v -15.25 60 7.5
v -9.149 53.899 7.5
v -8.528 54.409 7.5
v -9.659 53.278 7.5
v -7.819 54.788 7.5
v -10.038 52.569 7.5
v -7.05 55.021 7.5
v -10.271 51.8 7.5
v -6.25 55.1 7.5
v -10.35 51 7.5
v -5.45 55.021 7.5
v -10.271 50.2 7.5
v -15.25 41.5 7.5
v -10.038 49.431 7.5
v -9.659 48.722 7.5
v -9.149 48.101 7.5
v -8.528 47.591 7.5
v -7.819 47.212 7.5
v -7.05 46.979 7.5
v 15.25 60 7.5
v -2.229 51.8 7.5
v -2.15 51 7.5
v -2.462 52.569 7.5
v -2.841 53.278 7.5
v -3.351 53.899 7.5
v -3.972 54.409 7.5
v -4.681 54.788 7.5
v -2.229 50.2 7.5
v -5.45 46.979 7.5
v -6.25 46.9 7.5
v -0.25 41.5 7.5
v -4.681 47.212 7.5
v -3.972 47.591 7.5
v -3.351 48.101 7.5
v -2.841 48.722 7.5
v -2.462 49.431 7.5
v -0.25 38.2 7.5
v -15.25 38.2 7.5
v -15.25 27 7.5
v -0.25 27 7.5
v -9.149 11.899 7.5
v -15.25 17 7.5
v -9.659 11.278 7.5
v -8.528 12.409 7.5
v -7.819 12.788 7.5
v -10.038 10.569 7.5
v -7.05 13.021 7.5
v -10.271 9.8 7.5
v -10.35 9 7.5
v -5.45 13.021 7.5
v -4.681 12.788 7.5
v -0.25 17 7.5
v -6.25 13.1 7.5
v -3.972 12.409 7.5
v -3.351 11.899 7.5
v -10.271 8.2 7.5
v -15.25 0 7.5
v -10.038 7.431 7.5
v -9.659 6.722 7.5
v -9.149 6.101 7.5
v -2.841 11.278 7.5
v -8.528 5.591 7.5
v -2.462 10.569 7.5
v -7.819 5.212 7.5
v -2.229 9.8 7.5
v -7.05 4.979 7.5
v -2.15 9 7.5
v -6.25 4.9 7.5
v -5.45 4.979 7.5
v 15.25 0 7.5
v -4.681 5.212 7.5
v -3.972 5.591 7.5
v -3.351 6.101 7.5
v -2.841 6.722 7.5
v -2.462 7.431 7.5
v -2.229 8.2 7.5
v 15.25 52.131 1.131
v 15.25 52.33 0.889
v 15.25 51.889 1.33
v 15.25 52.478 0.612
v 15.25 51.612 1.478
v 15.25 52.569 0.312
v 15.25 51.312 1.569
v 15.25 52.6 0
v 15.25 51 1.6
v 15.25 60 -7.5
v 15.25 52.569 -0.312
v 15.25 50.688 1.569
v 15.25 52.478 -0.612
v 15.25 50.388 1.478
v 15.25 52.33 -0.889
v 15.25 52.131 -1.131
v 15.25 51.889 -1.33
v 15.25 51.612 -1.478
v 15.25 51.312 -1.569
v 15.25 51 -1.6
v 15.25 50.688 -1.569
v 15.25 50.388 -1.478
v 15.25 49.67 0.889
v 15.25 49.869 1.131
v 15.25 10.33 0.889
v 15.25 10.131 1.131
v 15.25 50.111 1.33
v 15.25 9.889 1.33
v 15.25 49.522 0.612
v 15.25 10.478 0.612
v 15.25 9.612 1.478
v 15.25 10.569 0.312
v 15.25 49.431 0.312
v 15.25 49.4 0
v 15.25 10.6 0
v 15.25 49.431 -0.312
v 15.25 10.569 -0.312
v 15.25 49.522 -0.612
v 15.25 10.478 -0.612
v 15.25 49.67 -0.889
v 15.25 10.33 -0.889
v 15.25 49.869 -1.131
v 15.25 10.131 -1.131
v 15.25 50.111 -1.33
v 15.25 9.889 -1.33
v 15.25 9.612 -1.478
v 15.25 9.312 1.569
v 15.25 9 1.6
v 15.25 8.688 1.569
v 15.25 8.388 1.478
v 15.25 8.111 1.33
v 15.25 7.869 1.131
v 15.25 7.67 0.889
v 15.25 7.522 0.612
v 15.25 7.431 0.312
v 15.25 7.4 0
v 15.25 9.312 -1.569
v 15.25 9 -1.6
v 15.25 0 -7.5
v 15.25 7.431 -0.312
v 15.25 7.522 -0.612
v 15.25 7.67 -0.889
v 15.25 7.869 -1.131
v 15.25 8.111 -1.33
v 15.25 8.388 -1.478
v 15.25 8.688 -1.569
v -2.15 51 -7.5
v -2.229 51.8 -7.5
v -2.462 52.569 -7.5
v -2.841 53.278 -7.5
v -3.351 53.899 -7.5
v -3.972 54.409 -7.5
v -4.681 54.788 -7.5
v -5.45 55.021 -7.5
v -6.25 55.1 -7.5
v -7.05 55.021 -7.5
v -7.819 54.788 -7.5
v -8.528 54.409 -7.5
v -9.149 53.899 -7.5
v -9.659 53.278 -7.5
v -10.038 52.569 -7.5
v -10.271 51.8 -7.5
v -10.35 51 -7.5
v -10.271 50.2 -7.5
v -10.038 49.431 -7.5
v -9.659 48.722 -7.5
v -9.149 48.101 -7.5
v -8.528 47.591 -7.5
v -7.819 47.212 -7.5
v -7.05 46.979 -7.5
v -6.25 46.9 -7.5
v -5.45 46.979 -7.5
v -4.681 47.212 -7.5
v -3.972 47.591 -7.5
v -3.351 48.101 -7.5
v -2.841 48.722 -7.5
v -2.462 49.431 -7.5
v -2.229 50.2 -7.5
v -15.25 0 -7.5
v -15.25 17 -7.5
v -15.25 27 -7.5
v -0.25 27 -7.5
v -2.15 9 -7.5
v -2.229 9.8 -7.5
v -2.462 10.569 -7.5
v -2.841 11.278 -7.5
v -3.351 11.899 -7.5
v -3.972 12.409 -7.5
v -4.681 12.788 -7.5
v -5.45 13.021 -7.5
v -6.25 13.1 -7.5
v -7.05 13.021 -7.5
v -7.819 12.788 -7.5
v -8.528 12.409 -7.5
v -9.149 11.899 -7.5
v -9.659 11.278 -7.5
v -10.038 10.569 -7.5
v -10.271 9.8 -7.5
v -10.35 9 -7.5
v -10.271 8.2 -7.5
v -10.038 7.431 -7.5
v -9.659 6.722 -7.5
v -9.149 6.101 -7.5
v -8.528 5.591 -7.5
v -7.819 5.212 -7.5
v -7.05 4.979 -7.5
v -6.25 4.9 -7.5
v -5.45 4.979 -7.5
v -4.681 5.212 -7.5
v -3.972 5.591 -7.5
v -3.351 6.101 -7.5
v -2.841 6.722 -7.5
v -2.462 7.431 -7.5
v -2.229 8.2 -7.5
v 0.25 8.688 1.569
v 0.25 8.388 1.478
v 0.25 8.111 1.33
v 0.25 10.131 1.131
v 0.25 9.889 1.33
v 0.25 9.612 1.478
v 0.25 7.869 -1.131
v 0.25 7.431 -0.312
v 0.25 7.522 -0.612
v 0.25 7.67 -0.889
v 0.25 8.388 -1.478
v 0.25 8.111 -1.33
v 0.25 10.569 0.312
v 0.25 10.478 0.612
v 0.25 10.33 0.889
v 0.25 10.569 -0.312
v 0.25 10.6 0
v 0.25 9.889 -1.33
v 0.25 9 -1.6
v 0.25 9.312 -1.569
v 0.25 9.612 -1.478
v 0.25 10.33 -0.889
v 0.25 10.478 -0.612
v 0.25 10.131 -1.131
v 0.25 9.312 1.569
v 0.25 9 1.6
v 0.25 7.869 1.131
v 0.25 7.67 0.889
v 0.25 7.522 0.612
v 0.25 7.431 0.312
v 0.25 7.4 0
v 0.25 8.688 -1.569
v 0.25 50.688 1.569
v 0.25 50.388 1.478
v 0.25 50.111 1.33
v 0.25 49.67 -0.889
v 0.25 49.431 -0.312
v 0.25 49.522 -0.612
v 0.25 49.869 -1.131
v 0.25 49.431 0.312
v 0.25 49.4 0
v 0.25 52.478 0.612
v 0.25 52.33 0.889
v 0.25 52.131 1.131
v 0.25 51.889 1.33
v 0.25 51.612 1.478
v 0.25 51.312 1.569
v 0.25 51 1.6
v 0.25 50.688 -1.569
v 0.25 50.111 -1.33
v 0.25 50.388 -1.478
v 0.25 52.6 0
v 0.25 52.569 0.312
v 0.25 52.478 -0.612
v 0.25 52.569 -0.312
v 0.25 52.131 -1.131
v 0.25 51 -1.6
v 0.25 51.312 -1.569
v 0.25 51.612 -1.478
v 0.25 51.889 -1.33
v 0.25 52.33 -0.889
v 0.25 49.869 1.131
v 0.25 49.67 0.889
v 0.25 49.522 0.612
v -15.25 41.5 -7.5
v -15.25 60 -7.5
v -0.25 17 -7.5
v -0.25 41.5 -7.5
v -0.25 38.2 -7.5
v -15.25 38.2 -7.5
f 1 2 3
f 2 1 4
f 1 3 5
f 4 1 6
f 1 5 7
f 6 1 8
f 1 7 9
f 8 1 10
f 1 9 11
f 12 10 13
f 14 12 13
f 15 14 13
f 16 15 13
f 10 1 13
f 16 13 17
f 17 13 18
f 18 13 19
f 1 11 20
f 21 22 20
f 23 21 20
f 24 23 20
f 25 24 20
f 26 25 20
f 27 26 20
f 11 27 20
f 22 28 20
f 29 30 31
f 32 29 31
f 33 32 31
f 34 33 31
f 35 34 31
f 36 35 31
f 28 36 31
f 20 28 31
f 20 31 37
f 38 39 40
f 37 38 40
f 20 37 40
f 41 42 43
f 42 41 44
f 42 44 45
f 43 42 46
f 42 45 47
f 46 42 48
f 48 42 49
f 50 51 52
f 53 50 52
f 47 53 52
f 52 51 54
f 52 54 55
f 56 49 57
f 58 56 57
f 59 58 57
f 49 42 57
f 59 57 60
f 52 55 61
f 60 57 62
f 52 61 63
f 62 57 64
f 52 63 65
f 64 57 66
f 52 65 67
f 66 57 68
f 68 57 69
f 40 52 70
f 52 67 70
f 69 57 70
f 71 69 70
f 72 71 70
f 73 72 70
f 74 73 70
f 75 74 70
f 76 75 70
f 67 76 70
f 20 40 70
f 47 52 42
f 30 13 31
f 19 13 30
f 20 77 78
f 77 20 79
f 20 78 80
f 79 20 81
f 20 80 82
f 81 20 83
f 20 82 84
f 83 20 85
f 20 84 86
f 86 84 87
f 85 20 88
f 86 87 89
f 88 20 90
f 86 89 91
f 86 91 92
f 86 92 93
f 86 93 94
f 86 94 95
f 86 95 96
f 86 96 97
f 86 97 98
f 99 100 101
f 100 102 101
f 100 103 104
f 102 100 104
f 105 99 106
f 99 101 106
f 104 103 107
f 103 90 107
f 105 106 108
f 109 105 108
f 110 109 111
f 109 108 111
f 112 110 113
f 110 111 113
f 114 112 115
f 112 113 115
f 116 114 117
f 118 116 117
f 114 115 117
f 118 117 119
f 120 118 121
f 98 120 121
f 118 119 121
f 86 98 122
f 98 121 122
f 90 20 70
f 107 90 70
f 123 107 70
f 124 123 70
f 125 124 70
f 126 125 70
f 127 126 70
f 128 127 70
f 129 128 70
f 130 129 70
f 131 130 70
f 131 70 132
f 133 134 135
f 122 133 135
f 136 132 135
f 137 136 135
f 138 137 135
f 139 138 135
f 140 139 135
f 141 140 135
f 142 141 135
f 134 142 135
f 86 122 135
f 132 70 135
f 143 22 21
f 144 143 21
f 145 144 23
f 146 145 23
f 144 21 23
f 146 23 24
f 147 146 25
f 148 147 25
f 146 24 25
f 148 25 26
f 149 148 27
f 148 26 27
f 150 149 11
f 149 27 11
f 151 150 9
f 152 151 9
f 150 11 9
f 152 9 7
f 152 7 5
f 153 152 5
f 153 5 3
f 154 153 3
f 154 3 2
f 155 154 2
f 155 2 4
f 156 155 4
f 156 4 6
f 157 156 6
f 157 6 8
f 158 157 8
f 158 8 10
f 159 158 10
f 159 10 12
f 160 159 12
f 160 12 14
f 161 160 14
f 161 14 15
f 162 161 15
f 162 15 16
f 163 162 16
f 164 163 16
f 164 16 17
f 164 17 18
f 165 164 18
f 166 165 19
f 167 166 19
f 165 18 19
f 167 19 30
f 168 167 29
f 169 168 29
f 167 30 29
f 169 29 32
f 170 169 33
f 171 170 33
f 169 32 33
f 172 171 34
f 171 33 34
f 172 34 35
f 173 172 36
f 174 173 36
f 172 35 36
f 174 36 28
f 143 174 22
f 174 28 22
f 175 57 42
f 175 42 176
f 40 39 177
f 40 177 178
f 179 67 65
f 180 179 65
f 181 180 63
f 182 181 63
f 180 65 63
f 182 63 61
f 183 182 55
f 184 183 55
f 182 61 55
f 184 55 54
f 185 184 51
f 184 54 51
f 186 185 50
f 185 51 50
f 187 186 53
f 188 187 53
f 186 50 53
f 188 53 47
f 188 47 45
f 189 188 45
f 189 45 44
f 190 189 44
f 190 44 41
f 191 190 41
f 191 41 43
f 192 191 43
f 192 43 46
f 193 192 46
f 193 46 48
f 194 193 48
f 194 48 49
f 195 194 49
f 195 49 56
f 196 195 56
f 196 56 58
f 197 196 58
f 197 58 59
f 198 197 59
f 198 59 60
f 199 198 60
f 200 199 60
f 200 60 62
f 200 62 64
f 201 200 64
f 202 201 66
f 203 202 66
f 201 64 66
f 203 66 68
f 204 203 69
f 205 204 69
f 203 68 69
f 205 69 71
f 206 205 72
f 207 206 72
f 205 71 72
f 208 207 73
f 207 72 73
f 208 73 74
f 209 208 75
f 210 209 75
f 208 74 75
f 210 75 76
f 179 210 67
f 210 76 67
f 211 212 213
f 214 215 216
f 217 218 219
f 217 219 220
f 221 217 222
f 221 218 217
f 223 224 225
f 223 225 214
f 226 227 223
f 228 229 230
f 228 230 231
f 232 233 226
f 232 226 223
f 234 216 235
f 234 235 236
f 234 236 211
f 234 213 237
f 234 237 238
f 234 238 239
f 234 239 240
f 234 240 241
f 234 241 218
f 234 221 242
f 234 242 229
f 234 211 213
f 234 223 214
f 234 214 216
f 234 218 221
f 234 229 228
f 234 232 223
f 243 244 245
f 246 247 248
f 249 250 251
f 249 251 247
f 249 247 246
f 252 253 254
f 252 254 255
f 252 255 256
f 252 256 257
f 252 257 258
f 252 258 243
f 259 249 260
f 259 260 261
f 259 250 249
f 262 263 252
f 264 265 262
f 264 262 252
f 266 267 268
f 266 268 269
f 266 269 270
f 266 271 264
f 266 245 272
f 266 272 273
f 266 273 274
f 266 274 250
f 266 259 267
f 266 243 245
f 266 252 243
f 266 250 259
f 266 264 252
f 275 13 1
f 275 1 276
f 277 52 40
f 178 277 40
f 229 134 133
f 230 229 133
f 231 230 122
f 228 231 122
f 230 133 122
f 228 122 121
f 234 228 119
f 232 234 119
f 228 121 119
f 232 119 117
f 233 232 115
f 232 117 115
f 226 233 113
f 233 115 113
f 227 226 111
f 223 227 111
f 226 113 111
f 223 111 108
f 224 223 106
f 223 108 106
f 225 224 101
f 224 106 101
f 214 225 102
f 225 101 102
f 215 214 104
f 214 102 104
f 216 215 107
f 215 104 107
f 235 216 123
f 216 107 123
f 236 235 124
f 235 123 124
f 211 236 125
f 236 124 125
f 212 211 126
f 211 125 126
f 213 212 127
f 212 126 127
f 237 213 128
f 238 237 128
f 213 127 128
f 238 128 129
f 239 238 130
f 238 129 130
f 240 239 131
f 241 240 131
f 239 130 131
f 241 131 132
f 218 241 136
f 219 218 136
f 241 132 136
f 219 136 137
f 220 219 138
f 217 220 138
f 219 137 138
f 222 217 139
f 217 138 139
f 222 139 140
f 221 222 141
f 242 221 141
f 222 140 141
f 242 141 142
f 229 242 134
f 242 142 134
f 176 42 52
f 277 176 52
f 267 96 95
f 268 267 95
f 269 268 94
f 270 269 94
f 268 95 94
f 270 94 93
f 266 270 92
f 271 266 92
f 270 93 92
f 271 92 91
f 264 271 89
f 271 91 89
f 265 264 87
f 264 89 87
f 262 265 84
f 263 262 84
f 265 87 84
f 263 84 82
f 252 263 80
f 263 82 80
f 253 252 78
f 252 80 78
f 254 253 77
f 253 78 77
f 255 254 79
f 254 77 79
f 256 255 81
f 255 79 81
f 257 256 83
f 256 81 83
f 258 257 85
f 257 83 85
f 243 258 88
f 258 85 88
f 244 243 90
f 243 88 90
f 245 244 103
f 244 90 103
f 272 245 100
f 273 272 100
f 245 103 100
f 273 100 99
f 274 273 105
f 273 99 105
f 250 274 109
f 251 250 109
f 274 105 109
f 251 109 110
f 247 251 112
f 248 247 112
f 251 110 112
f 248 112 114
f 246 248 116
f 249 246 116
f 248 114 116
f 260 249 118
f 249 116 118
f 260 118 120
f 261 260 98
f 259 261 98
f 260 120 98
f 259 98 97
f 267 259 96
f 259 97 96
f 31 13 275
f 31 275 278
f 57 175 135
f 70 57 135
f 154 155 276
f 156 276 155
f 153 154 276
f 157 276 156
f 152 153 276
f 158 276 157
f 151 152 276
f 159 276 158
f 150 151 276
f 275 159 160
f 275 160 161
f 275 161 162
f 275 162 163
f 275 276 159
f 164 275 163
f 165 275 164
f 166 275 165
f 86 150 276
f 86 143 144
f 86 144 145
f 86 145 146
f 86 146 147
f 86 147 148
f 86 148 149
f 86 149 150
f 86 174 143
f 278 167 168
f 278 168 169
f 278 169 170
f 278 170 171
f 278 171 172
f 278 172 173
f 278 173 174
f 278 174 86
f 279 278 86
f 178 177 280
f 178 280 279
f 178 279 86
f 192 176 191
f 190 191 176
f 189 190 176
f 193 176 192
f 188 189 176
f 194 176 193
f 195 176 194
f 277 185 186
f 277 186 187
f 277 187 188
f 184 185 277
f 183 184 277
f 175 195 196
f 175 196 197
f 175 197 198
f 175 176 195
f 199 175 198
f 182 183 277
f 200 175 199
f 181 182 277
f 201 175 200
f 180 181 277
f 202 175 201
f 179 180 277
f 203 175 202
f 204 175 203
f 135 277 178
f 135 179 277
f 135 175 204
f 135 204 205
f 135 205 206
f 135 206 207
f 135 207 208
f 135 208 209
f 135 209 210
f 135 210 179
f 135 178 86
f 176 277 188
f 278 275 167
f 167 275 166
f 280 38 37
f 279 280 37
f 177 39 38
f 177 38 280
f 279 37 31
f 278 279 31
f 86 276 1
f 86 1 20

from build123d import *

# Parameters (mm, degrees)
SKETCH1_W           = 30.5
SKETCH1_H           = 15
BOSS_EXTRUDE1_DEPTH = 60
SKETCH2_R           = 4.1
CUT_EXTRUDE1_DEPTH  = 16
SKETCH4_W           = 15
SKETCH4_H           = 3.3
CUT_EXTRUDE2_DEPTH  = 16
SKETCH5_W           = 15
SKETCH5_H           = 10
CUT_EXTRUDE3_DEPTH  = 16
SKETCH6_R           = 1.6
CUT_EXTRUDE4_DEPTH  = 15


with BuildPart() as part:
    # Sketch1 → Boss-Extrude1 (new body)
    with BuildSketch(Plane(origin=(0, 0, 0), x_dir=(1, 0, 0), z_dir=(0, 1, 0))):
        Rectangle(SKETCH1_W, SKETCH1_H)
    extrude(amount=BOSS_EXTRUDE1_DEPTH)

    # Sketch2 → Cut-Extrude1 (cut, through all)
    with BuildSketch(Plane.XY.offset(7.5)):
        with Locations((-6.25, 51)):
            Circle(SKETCH2_R)
        with Locations((-6.25, 9)):
            Circle(SKETCH2_R)
    extrude(amount=-CUT_EXTRUDE1_DEPTH, mode=Mode.SUBTRACT)

    # Sketch4 → Cut-Extrude2 (cut, through all)
    with BuildSketch(Plane.XY.offset(7.5)):
        with Locations((-7.75, 39.85)):
            Rectangle(SKETCH4_W, SKETCH4_H)
    extrude(amount=-CUT_EXTRUDE2_DEPTH, mode=Mode.SUBTRACT)

    # Sketch5 → Cut-Extrude3 (cut, through all)
    with BuildSketch(Plane.XY.offset(7.5)):
        with Locations((-7.75, 22)):
            Rectangle(SKETCH5_W, SKETCH5_H)
    extrude(amount=-CUT_EXTRUDE3_DEPTH, mode=Mode.SUBTRACT)

    # Sketch6 → Cut-Extrude4 (cut)
    with BuildSketch(Plane(origin=(15.25, 0, 0), x_dir=(0, 0, -1), z_dir=(1, 0, 0))):
        with Locations((0, 51)):
            Circle(SKETCH6_R)
        with Locations((0, 9)):
            Circle(SKETCH6_R)
    extrude(amount=-CUT_EXTRUDE4_DEPTH, mode=Mode.SUBTRACT)


solid = part.part
